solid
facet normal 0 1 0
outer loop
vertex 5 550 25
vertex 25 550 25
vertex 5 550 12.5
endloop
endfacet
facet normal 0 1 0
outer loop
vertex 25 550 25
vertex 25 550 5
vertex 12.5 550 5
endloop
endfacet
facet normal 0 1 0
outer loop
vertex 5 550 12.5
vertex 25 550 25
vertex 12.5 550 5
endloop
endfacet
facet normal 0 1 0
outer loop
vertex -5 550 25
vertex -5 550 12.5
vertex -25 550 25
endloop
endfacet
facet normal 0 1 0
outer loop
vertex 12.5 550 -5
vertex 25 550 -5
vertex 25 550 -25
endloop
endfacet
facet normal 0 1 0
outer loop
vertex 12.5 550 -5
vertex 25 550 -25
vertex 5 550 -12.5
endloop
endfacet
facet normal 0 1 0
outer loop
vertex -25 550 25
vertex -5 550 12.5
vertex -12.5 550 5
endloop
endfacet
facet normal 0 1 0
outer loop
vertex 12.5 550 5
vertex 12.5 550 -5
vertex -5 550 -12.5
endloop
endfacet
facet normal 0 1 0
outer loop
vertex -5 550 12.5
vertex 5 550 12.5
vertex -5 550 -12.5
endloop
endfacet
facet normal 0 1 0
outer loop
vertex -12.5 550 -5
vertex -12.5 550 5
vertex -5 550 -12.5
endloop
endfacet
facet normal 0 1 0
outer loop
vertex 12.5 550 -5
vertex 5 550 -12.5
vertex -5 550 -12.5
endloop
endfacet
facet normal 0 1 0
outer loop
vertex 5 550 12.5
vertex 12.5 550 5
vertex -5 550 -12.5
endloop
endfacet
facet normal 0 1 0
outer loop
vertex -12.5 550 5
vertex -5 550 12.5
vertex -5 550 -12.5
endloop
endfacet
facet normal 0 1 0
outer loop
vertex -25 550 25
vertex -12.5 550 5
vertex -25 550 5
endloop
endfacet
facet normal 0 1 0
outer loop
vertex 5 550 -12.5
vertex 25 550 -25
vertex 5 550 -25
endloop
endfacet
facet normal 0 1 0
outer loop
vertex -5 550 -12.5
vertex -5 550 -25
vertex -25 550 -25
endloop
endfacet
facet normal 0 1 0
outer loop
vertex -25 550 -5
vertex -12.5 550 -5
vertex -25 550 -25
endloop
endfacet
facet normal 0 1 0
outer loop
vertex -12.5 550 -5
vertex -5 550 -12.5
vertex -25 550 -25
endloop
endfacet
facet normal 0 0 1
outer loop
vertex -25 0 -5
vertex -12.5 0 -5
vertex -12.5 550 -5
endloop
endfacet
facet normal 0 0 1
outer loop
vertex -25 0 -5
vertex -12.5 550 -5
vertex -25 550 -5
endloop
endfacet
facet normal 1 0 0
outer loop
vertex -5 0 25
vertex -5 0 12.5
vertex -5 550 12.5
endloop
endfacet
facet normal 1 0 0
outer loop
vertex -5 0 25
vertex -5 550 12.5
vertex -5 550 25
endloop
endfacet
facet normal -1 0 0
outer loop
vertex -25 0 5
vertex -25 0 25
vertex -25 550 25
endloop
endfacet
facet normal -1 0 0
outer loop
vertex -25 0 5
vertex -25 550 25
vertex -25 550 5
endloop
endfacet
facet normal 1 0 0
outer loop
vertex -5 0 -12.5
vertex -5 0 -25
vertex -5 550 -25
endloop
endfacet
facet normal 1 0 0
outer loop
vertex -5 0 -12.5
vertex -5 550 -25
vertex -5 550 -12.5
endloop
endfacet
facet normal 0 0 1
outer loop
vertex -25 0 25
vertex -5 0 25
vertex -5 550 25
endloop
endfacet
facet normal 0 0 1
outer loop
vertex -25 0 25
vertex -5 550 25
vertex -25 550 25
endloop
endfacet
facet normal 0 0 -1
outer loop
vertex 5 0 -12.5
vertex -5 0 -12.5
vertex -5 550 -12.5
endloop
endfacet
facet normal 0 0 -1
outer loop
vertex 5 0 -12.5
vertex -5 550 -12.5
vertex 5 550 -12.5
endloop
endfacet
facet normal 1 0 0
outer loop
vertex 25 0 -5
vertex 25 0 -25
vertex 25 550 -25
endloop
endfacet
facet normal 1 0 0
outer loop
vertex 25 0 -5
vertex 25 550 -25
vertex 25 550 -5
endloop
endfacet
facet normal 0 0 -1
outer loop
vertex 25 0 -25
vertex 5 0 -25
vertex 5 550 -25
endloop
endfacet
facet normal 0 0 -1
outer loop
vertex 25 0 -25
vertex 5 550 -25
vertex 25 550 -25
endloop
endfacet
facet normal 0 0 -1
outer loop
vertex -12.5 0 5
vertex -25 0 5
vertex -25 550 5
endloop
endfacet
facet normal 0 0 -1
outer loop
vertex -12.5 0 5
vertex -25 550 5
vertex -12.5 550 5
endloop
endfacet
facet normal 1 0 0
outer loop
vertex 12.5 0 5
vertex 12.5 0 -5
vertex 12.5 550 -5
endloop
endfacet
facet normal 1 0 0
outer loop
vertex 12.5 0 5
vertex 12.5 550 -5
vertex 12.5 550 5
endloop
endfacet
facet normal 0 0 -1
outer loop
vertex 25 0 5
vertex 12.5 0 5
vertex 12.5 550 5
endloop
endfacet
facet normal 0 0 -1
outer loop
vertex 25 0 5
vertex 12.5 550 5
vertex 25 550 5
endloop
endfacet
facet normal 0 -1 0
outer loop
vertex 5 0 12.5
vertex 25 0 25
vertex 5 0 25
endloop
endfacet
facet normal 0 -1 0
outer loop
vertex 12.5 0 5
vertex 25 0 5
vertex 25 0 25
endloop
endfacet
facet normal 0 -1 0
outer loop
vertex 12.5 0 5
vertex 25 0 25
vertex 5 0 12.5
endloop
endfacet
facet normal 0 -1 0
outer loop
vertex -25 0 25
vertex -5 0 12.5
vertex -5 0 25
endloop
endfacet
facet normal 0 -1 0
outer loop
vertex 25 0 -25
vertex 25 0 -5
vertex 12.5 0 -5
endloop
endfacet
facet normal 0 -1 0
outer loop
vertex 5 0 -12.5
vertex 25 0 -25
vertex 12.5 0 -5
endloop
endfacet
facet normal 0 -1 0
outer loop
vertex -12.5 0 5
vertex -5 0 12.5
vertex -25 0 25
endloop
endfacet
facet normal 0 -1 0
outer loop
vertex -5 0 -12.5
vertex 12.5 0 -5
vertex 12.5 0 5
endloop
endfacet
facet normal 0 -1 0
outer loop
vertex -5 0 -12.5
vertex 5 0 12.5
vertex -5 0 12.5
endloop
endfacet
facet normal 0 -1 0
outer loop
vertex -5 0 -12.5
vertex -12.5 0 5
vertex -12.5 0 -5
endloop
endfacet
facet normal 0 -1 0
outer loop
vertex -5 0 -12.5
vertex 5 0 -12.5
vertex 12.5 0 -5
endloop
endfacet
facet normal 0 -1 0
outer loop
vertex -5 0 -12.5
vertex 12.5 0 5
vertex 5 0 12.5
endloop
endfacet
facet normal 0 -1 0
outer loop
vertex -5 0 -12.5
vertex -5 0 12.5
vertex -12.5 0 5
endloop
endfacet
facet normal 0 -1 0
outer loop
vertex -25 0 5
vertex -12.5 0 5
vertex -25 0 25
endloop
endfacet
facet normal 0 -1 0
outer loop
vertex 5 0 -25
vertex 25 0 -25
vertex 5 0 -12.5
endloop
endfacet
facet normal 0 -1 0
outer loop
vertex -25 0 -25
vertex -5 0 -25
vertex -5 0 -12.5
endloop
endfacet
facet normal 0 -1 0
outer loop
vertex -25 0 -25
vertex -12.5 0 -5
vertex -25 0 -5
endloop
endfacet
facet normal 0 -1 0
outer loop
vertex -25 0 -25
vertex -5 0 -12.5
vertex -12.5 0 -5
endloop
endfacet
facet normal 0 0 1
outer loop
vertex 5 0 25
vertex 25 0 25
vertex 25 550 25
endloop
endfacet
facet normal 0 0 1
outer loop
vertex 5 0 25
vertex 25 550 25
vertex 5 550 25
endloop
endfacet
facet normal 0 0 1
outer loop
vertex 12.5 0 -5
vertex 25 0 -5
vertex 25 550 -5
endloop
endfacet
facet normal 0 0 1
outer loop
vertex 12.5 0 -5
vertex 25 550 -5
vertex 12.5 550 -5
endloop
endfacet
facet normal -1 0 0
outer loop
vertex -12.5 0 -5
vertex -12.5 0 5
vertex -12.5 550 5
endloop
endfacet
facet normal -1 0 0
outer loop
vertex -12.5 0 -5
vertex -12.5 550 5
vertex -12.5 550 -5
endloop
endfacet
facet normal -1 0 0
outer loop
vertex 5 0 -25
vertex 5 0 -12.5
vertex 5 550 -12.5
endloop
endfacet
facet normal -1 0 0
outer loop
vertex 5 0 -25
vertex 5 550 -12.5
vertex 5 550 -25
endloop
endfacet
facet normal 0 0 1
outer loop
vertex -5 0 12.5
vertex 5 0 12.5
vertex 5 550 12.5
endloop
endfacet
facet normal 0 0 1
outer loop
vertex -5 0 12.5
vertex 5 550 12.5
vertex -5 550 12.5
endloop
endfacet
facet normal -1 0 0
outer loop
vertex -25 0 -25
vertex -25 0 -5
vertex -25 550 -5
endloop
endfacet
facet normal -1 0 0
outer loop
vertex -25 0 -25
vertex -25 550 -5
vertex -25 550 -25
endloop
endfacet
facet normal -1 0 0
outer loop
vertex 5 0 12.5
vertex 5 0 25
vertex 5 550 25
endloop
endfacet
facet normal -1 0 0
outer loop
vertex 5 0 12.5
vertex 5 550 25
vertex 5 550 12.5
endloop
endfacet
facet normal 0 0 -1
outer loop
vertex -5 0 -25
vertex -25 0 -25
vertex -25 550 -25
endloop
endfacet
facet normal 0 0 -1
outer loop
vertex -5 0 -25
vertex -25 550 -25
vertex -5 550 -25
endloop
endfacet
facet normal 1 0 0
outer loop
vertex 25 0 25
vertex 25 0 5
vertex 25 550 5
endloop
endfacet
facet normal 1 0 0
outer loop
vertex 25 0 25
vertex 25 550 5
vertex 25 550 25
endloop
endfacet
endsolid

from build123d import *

# Parameters (mm, degrees)
BOSS_EXTRUDE1_DEPTH = 550
BOSS_EXTRUDE2_DEPTH = 10


with BuildPart() as part:
    # Sketch1 → Boss-Extrude1 (new body)
    with BuildSketch(Plane(origin=(0, 0, 0), x_dir=(1, 0, 0), z_dir=(0, 1, 0))):
        Polygon((-25, 25), (-5, 25), (-5, 12.5), (5, 12.5), (5, 25), (25, 25), (25, 5), (12.5, 5), (12.5, -5), (25, -5), (25, -25), (5, -25), (5, -12.5), (-5, -12.5), (-5, -25), (-25, -25), (-25, -5), (-12.5, -5), (-12.5, 5), (-25, 5), align=None)
    extrude(amount=BOSS_EXTRUDE1_DEPTH)

    # Sketch1<2> → Boss-Extrude2 (add)
    with BuildSketch(Plane(origin=(0, 0, 0), x_dir=(1, 0, 0), z_dir=(0, 1, 0))):
        Polygon((-25, 25), (-5, 25), (-5, 12.5), (5, 12.5), (5, 25), (25, 25), (25, 5), (12.5, 5), (12.5, -5), (25, -5), (25, -25), (5, -25), (5, -12.5), (-5, -12.5), (-5, -25), (-25, -25), (-25, -5), (-12.5, -5), (-12.5, 5), (-25, 5), align=None)
    extrude(amount=BOSS_EXTRUDE2_DEPTH)


solid = part.part
